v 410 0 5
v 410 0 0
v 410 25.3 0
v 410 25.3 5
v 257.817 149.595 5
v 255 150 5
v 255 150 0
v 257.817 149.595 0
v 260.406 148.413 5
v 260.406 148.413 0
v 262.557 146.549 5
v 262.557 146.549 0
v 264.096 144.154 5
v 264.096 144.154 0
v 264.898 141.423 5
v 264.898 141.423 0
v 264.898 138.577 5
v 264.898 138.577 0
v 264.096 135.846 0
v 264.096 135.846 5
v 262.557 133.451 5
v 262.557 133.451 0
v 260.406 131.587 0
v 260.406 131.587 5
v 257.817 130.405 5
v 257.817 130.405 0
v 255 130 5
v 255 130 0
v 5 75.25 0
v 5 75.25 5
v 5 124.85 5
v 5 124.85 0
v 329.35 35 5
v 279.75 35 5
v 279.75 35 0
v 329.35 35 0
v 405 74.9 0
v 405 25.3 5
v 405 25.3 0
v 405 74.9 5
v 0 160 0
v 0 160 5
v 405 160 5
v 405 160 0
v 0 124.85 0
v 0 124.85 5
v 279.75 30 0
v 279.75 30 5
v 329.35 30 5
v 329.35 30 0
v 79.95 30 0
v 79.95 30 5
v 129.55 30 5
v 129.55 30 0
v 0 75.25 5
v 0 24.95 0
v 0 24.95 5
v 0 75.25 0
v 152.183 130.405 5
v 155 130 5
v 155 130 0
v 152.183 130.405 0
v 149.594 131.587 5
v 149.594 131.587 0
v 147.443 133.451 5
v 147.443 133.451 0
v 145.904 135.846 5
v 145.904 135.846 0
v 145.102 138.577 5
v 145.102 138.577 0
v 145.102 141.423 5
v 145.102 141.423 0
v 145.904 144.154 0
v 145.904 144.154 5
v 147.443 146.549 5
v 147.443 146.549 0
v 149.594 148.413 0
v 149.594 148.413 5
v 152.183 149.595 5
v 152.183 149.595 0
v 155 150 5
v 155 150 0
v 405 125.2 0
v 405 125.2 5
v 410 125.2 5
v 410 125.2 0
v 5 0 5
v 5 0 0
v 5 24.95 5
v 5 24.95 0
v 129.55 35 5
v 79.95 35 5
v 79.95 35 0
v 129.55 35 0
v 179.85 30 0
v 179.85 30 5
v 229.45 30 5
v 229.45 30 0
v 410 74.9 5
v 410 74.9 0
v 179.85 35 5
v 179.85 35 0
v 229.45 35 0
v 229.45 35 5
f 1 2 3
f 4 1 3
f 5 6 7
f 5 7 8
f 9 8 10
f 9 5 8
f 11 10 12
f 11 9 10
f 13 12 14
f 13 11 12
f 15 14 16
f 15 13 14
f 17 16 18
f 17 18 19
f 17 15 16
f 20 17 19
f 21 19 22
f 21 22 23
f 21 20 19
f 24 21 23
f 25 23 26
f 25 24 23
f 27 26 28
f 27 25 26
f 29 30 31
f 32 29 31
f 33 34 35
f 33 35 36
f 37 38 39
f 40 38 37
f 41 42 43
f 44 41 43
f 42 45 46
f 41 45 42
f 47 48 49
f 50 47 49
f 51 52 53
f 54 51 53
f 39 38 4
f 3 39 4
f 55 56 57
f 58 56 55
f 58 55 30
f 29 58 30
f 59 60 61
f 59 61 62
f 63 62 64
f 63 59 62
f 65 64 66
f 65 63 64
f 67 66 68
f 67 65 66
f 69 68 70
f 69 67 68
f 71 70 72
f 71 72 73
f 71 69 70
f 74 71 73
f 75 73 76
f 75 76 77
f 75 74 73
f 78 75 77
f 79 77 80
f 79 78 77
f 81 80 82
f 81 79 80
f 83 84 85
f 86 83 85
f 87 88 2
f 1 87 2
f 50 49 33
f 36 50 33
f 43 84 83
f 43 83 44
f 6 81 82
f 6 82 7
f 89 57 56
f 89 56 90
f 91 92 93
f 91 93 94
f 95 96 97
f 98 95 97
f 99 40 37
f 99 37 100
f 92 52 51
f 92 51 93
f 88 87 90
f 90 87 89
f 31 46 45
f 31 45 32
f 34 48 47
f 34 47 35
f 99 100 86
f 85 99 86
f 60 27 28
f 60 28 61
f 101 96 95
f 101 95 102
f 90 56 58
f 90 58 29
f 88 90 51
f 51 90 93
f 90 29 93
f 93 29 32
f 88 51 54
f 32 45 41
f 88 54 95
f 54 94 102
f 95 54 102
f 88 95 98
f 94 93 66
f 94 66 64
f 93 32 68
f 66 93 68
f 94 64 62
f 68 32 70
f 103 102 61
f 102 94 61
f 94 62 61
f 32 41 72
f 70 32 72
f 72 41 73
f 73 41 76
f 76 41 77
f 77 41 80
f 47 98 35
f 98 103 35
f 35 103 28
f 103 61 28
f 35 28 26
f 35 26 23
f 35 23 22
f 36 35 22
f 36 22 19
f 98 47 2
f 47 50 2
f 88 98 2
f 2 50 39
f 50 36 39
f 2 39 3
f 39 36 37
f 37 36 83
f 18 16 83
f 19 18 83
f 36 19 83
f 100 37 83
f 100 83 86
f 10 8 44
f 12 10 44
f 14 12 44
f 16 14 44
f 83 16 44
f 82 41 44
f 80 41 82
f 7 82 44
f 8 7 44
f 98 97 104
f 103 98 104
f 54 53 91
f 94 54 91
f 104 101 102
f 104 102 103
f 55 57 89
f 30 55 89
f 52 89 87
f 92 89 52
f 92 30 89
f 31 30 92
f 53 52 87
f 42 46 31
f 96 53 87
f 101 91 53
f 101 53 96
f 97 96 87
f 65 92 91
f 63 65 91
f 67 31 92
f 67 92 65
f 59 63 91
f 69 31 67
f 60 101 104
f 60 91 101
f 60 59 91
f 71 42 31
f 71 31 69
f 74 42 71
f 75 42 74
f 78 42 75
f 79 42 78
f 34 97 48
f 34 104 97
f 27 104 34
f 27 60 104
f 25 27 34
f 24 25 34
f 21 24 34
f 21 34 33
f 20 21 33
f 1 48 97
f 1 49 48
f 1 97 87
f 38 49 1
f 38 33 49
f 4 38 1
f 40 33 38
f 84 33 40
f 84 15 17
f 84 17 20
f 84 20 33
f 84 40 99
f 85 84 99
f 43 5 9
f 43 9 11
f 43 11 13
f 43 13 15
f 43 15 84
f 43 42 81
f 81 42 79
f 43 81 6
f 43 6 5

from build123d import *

# Parameters (mm, degrees)
SKIZZE1_W                       = 410
SKIZZE1_H                       = 300
AUFSATZ_LINEAR_AUSTRAGEN1_DEPTH = 5
SKIZZE2_W                       = 46.676040128
SKIZZE2_H                       = 49.6
SCHNITT_LINEAR_AUSTRAGEN1_DEPTH = 5
LINEARES_MUSTER1_COUNT          = 4
LINEARES_MUSTER1_PITCH          = 99.9
SKIZZE3_W                       = 27.663601369
SKIZZE3_H                       = 49.6
SCHNITT_LINEAR_AUSTRAGEN2_DEPTH = 5
LINEARES_MUSTER2_COUNT          = 3
LINEARES_MUSTER2_PITCH          = 99.9
SKIZZE4_W                       = 49.6
SKIZZE4_H                       = 5
SCHNITT_LINEAR_AUSTRAGEN3_DEPTH = 5
LINEARES_MUSTER3_COUNT          = 3
LINEARES_MUSTER3_PITCH          = 99.9
SCHNITT_LINEAR_AUSTRAGEN4_DEPTH = 5


with BuildPart() as part:
    # Skizze1 → Aufsatz-Linear austragen1 (new body)
    with BuildSketch(Plane.XY):
        with Locations((205, 150)):
            Rectangle(SKIZZE1_W, SKIZZE1_H)
    extrude(amount=AUFSATZ_LINEAR_AUSTRAGEN1_DEPTH)

    # Skizze2 → Schnitt-Linear austragen1 (cut)
    with BuildSketch(Plane.XY.offset(5)):
        with Locations((-18.338020064, 299.85)):
            Rectangle(SKIZZE2_W, SKIZZE2_H)
    schnitt_linear_austragen1 = extrude(amount=-SCHNITT_LINEAR_AUSTRAGEN1_DEPTH, mode=Mode.SUBTRACT)

    # Lineares Muster1: Schnitt-Linear austragen1 ×4
    with Locations(*[(0, -i * LINEARES_MUSTER1_PITCH, 0) for i in range(1, LINEARES_MUSTER1_COUNT)]):
        add(schnitt_linear_austragen1, mode=Mode.SUBTRACT)

    # Skizze3 → Schnitt-Linear austragen2 (cut)
    with BuildSketch(Plane.XY.offset(5)):
        with Locations((418.831800685, 249.9)):
            Rectangle(SKIZZE3_W, SKIZZE3_H)
    schnitt_linear_austragen2 = extrude(amount=-SCHNITT_LINEAR_AUSTRAGEN2_DEPTH, mode=Mode.SUBTRACT)

    # Lineares Muster2: Schnitt-Linear austragen2 ×3
    with Locations(*[(0, -i * LINEARES_MUSTER2_PITCH, 0) for i in range(1, LINEARES_MUSTER2_COUNT)]):
        add(schnitt_linear_austragen2, mode=Mode.SUBTRACT)

    # Skizze4 → Schnitt-Linear austragen3 (cut)
    with BuildSketch(Plane.XY.offset(5)):
        with Locations((104.75, 32.5)):
            Rectangle(SKIZZE4_W, SKIZZE4_H)
    schnitt_linear_austragen3 = extrude(amount=-SCHNITT_LINEAR_AUSTRAGEN3_DEPTH, mode=Mode.SUBTRACT)

    # Lineares Muster3: Schnitt-Linear austragen3 ×3
    with Locations(*[(i * LINEARES_MUSTER3_PITCH, 0, 0) for i in range(1, LINEARES_MUSTER3_COUNT)]):
        add(schnitt_linear_austragen3, mode=Mode.SUBTRACT)

    # Skizze5 → Schnitt-Linear austragen4 (cut)
    with BuildSketch(Plane.XY.offset(5)):
        Polygon((0, 160), (405, 160), (496.663114114, 346.337546914), (-27.8257996, 333.824324496), (-27.8257996, 200.492217914), align=None)
        with BuildLine():
            Line((155, 150), (255, 150))
            ThreePointArc((255, 150), (265, 140), (255, 130))
            Line((255, 130), (155, 130))
            ThreePointArc((155, 130), (145, 140), (155, 150))
        make_face()
    extrude(amount=-SCHNITT_LINEAR_AUSTRAGEN4_DEPTH, mode=Mode.SUBTRACT)


solid = part.part
